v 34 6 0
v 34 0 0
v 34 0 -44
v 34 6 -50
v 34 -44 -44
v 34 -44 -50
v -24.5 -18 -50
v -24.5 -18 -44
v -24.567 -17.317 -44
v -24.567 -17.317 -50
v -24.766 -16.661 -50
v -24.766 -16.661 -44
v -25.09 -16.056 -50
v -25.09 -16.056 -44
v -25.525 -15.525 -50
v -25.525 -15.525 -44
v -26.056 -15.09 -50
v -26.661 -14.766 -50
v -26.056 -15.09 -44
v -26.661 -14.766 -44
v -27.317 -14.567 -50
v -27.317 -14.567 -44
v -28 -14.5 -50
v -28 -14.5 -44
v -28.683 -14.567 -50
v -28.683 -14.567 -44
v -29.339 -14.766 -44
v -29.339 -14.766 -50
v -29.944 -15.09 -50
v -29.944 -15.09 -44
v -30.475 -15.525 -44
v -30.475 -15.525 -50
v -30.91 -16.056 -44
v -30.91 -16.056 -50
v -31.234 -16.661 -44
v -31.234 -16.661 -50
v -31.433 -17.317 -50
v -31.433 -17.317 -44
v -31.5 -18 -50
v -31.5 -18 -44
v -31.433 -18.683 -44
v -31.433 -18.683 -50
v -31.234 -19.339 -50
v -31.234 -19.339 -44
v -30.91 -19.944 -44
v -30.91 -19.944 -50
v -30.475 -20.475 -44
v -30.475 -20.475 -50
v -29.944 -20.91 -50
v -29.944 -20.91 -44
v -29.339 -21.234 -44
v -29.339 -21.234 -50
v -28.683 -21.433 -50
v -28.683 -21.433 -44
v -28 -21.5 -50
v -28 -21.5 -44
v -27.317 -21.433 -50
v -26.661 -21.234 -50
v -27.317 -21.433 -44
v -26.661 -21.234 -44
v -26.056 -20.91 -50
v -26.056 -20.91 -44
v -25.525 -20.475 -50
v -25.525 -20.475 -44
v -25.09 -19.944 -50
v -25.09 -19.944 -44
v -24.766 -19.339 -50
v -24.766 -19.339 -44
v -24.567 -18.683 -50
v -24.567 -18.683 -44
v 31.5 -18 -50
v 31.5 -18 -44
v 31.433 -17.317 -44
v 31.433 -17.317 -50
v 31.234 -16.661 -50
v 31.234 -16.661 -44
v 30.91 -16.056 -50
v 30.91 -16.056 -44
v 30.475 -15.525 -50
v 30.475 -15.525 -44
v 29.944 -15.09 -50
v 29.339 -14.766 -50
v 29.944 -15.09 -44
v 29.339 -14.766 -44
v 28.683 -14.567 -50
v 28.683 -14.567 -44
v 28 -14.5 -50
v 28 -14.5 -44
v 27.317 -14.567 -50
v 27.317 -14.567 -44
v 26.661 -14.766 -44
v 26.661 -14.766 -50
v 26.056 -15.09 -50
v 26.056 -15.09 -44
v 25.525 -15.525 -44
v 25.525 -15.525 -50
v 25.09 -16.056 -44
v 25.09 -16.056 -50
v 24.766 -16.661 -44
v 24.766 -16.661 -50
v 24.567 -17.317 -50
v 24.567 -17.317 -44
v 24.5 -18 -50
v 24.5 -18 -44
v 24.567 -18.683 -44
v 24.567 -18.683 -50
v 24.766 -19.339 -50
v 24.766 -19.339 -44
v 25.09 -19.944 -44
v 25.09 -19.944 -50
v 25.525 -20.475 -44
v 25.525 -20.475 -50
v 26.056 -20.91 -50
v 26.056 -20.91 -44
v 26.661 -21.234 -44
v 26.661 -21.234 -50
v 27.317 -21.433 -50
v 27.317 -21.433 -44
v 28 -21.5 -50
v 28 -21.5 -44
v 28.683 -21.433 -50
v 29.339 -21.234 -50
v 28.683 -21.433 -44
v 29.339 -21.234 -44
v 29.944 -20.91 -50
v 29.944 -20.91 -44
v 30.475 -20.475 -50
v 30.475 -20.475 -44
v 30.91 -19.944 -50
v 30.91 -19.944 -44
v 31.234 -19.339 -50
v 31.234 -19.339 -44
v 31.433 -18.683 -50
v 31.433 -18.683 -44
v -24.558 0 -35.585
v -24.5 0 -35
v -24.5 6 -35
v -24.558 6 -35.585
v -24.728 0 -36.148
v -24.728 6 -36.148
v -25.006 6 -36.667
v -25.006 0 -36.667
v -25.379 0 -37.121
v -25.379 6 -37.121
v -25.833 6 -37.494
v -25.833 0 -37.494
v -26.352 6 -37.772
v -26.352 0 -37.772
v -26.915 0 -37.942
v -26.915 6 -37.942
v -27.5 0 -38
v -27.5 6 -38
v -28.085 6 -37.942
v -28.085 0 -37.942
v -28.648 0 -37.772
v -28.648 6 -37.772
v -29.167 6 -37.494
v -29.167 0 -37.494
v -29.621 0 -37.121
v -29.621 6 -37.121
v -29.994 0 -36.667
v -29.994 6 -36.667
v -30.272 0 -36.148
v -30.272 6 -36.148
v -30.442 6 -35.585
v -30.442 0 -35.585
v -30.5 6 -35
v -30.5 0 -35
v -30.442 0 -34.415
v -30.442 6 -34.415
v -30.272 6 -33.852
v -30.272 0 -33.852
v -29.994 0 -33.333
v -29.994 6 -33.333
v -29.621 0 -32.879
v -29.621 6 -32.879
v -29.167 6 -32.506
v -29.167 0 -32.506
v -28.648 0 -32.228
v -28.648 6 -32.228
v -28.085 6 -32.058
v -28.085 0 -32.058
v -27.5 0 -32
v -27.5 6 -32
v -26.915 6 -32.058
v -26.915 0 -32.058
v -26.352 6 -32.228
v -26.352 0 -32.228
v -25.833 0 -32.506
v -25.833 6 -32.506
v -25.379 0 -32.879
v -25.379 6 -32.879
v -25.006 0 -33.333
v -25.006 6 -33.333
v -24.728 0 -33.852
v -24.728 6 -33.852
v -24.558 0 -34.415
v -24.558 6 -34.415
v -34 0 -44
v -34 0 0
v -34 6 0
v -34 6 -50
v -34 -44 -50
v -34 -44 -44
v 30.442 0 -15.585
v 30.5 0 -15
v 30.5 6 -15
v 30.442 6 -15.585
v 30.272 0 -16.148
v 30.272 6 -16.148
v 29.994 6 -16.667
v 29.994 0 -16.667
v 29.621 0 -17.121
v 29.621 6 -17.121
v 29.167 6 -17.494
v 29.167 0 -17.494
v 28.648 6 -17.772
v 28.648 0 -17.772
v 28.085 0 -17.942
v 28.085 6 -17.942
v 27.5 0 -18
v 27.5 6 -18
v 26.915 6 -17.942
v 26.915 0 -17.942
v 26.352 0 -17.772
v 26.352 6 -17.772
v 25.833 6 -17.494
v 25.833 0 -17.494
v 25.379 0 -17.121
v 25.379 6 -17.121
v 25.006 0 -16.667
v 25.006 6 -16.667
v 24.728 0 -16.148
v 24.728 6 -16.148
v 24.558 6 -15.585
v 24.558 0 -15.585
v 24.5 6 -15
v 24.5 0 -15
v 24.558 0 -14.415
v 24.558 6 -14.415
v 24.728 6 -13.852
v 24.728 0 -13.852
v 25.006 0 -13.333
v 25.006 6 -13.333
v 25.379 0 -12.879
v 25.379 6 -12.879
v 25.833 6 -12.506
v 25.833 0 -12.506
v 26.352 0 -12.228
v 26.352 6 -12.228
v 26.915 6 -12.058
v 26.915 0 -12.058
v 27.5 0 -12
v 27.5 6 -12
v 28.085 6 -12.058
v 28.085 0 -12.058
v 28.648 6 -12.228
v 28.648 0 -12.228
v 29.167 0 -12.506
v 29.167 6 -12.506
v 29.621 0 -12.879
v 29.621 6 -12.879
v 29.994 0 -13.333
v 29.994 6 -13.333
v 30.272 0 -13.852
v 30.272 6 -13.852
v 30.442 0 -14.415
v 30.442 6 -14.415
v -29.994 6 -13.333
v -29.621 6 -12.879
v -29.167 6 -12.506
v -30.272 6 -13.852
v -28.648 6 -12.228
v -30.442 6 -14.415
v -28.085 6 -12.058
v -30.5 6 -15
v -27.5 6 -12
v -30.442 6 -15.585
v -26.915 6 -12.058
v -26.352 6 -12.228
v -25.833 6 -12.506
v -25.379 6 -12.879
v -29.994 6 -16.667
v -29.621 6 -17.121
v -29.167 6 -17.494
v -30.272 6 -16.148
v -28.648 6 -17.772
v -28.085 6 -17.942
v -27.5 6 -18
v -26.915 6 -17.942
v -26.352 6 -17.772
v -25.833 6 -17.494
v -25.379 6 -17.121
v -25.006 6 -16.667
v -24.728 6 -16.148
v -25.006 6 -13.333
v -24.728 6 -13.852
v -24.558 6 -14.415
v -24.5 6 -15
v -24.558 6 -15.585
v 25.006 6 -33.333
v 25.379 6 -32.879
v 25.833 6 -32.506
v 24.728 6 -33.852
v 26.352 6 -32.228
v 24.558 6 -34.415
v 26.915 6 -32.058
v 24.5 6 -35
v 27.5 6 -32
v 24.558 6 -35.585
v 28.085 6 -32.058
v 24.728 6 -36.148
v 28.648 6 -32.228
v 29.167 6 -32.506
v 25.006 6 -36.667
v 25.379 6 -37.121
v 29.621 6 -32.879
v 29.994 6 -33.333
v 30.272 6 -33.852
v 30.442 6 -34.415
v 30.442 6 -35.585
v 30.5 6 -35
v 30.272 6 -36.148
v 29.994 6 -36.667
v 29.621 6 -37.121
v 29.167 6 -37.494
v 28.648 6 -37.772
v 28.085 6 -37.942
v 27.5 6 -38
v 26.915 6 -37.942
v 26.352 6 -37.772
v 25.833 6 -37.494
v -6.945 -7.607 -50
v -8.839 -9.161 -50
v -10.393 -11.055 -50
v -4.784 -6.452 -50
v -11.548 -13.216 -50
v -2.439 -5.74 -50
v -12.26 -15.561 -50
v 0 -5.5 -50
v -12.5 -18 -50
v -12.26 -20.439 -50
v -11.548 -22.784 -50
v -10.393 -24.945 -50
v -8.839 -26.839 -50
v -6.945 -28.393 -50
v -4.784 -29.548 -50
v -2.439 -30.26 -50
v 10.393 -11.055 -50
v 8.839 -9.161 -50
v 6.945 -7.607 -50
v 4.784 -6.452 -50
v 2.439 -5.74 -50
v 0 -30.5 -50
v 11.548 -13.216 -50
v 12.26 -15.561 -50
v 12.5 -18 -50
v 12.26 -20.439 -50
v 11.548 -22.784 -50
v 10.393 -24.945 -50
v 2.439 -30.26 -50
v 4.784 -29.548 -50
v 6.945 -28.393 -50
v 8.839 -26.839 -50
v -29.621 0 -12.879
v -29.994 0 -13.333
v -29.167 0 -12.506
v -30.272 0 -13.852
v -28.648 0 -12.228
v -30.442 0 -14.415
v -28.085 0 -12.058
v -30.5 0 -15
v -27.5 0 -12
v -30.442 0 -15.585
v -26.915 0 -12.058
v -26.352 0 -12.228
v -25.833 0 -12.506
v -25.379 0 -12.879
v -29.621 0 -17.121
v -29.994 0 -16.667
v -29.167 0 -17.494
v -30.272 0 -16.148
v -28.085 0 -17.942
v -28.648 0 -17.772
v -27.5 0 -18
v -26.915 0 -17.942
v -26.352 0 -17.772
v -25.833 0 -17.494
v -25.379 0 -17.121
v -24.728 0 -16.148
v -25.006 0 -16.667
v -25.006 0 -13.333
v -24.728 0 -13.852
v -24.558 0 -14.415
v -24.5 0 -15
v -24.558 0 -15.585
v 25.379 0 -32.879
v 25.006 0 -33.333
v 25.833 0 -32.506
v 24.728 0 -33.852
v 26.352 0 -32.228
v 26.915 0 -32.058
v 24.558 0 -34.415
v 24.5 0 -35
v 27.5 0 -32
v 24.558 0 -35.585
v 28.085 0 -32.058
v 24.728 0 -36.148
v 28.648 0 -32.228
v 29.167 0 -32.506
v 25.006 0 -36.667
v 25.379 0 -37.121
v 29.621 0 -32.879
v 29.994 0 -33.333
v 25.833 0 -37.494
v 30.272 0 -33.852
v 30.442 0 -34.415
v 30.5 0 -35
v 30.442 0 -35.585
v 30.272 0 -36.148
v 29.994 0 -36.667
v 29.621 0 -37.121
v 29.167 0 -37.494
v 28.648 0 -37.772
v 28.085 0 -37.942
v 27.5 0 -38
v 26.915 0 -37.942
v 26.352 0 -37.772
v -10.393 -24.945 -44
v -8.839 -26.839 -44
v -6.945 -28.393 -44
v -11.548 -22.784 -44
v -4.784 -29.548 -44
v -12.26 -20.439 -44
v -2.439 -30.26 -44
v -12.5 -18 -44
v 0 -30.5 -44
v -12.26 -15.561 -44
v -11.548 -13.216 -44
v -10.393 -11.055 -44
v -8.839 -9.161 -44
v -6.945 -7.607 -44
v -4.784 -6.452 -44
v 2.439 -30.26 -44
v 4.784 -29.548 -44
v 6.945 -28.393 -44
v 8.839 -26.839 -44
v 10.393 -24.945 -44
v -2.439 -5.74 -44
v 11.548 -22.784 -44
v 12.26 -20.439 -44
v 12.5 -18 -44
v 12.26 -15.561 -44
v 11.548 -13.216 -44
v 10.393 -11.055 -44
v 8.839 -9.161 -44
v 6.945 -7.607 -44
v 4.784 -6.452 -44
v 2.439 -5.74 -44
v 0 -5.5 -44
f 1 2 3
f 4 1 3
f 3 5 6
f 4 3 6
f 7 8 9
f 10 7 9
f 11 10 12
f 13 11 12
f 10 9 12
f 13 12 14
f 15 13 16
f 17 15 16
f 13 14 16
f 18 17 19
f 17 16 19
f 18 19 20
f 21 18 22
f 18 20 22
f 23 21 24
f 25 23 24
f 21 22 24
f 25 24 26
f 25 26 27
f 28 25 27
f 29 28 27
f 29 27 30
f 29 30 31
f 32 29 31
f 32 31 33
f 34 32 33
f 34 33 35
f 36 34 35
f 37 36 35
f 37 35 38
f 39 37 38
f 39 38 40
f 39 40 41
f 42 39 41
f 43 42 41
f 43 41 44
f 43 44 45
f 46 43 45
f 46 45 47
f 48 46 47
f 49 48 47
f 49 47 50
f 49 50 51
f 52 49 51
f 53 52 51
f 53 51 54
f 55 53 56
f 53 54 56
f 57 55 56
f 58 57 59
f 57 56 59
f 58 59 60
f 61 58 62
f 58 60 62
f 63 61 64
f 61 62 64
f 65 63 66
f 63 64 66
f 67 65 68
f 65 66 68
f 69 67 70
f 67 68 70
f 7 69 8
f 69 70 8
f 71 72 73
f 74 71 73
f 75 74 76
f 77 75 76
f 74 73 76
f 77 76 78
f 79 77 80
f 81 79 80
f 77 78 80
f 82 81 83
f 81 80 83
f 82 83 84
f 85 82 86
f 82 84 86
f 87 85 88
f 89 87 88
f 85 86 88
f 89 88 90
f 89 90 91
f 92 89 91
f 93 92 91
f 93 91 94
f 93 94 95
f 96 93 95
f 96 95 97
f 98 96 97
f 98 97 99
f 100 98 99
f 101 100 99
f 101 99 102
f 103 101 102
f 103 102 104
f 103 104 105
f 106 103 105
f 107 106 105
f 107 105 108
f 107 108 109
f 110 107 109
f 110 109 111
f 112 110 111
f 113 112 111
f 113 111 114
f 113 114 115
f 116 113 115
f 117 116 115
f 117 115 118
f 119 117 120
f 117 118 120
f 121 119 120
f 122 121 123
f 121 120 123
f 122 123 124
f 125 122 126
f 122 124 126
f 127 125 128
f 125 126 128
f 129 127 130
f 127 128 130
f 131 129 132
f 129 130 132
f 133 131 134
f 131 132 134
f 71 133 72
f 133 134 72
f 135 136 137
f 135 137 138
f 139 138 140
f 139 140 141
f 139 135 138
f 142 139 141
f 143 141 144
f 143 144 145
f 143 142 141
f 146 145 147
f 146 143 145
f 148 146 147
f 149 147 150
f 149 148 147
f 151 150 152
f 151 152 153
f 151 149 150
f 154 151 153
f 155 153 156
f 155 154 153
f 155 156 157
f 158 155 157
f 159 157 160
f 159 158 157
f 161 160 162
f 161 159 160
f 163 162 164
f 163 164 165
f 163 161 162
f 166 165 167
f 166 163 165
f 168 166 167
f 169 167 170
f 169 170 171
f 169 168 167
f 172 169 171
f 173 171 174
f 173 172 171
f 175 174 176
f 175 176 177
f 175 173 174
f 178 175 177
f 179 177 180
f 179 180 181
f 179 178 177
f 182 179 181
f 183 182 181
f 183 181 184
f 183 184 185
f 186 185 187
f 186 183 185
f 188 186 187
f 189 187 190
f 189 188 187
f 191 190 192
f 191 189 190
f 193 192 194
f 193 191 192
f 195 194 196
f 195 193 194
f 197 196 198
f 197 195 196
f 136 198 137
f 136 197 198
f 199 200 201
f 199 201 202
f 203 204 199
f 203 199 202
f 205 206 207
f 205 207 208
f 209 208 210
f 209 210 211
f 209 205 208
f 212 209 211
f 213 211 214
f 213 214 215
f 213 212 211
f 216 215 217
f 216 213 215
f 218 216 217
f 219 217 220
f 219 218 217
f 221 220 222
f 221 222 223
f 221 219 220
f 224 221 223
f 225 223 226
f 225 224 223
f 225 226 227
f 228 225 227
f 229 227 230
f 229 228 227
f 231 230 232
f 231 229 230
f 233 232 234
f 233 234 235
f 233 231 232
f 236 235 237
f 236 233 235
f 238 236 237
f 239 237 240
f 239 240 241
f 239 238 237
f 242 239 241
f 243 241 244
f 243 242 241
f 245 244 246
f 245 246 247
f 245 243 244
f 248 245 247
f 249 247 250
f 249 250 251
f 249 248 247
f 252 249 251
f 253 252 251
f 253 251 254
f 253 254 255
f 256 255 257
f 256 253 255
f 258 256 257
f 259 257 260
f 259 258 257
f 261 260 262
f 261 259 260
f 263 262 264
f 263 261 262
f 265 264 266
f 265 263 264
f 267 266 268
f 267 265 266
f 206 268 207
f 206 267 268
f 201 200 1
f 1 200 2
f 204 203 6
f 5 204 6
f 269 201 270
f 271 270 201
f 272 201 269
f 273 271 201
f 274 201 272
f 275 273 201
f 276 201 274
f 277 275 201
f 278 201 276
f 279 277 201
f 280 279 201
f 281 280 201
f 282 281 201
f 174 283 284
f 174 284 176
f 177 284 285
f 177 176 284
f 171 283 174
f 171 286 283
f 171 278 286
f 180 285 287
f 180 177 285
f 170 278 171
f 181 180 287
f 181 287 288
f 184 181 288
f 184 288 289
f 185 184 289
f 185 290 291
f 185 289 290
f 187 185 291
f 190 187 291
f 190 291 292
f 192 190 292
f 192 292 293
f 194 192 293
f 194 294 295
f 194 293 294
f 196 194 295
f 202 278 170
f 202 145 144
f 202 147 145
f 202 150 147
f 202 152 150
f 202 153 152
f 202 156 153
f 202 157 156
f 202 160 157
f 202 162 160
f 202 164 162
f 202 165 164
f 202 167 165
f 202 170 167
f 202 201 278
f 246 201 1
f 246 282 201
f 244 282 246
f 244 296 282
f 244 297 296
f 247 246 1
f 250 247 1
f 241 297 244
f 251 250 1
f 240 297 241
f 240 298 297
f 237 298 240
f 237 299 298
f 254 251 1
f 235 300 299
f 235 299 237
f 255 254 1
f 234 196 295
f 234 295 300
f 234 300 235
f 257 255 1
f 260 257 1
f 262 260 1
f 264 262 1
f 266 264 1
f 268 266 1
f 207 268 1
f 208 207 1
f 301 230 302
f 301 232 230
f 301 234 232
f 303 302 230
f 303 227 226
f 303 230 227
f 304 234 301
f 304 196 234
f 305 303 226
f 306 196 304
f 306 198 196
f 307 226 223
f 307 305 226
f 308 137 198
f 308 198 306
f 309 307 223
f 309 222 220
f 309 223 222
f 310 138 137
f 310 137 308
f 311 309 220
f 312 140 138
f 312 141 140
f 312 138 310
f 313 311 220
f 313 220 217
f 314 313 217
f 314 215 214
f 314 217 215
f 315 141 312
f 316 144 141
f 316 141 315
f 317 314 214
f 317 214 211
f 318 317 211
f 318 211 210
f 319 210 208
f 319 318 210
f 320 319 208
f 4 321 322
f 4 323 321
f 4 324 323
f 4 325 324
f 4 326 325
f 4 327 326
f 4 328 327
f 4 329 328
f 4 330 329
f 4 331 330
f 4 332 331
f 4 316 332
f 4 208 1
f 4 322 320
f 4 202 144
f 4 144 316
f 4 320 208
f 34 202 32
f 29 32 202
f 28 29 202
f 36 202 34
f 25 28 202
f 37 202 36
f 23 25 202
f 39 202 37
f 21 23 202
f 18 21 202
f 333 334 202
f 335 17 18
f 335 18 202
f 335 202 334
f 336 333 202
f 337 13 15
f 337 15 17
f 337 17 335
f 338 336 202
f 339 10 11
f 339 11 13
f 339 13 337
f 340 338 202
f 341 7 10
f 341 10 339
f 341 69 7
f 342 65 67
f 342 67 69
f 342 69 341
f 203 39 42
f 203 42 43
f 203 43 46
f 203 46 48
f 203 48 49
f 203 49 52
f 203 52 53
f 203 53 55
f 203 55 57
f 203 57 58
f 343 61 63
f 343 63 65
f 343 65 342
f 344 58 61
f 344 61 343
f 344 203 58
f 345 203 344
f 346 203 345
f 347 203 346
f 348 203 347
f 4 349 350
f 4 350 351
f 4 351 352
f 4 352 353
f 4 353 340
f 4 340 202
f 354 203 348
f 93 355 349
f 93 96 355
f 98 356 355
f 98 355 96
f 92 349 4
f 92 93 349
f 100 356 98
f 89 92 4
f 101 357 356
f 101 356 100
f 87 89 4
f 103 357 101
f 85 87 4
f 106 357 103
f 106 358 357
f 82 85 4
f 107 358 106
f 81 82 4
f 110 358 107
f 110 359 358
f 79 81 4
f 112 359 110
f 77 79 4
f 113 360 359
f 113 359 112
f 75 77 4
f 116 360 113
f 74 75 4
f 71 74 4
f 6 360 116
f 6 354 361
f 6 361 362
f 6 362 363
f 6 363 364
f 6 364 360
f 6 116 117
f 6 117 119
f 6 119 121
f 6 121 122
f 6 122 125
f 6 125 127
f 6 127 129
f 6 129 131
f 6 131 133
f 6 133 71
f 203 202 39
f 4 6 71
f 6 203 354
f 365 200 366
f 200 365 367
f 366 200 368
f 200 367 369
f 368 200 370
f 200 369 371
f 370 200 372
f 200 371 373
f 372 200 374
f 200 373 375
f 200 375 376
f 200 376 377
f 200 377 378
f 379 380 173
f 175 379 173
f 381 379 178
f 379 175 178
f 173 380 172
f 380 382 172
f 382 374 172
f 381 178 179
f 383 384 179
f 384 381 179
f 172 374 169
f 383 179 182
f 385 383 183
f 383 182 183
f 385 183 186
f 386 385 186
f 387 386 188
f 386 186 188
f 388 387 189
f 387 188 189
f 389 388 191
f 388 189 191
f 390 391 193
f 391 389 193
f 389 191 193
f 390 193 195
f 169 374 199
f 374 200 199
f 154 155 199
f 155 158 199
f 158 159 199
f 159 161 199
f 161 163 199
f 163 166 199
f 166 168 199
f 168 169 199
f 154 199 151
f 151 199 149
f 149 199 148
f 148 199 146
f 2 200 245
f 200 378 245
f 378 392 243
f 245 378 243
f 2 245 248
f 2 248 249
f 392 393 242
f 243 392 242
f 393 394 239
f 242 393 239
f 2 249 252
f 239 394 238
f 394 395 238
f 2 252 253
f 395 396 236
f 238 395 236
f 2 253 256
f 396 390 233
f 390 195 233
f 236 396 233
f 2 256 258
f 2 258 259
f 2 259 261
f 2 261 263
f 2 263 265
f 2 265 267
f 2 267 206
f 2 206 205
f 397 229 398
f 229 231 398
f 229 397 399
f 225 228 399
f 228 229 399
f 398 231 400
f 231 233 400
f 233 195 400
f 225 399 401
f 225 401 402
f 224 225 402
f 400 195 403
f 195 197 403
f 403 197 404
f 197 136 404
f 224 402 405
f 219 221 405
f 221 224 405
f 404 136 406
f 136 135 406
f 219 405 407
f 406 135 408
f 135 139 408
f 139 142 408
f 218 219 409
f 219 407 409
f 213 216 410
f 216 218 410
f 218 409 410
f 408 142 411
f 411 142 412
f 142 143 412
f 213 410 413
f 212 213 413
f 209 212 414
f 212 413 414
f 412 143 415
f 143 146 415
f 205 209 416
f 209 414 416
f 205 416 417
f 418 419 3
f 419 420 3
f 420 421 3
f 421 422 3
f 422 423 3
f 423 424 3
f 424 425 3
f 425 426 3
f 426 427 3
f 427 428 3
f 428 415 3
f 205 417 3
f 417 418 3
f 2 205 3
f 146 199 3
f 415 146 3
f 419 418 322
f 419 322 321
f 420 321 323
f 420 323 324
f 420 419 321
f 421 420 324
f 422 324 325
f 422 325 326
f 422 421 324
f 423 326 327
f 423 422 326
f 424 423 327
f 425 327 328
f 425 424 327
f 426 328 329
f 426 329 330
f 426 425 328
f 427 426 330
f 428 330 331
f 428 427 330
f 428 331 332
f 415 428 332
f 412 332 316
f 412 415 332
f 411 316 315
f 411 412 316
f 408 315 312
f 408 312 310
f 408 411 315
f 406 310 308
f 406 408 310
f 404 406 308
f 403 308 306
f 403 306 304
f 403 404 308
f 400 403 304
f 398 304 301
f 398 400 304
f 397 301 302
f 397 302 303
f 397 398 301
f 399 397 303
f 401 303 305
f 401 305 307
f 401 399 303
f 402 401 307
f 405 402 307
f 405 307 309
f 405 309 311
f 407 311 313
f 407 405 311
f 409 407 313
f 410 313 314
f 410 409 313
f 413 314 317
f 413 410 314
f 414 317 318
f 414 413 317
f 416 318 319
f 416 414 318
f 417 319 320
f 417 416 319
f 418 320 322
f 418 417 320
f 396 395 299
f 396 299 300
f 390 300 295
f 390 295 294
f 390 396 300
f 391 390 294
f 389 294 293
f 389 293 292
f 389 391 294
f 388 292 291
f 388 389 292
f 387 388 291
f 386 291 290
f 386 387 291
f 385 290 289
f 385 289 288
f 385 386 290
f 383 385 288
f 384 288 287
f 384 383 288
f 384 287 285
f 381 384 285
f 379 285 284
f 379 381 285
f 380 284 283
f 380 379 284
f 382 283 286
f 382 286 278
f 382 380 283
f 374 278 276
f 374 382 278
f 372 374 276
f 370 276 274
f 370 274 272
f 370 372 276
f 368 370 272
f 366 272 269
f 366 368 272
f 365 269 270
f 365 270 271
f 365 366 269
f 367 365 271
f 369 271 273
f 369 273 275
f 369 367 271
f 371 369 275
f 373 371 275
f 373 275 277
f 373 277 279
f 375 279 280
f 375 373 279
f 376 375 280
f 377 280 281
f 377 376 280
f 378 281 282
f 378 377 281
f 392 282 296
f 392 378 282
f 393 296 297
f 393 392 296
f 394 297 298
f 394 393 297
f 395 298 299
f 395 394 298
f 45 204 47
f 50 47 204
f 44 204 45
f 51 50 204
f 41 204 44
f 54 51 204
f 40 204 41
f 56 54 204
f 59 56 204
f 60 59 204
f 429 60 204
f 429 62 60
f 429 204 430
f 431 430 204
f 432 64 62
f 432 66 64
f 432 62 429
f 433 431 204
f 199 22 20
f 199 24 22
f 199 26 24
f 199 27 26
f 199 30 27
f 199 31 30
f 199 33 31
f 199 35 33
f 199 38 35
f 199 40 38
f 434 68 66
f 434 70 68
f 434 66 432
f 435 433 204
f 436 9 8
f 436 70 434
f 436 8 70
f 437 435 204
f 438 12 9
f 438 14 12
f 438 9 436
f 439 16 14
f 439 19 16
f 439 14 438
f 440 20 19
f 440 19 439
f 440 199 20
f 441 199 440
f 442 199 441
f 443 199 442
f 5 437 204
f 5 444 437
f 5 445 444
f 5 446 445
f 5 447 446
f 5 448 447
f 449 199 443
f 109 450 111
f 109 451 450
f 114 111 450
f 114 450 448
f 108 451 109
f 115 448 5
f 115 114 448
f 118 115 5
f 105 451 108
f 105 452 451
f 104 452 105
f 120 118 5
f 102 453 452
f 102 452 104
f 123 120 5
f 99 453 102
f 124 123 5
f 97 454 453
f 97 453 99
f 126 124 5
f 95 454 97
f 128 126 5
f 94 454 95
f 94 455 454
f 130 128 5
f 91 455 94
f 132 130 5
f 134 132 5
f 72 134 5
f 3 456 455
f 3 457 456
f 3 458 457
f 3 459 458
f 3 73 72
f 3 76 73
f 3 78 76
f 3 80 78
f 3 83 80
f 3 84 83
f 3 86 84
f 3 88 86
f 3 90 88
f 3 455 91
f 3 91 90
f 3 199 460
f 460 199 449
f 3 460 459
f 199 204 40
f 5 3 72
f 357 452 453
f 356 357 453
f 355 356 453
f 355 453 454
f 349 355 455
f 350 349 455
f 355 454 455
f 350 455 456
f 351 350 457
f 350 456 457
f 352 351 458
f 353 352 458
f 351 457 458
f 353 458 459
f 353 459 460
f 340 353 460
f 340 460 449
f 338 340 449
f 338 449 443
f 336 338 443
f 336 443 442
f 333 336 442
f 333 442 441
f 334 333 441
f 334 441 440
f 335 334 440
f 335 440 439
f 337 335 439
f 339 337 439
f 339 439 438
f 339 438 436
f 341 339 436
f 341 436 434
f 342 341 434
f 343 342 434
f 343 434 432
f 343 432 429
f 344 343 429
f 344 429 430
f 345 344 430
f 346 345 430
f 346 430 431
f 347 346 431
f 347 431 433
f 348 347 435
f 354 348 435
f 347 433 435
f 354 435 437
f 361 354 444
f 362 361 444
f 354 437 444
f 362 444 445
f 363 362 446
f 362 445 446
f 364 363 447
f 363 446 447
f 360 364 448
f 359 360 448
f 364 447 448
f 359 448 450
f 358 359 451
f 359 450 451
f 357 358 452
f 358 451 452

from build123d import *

# Parameters (mm, degrees)
SKETCH_1_W          = 68
SKETCH_1_H          = 50
SKETCH_1_R          = 3
EXTRUDE_1_DEPTH     = 6
SKETCH_3_W          = 68
SKETCH_3_H          = 6
EXTRUDE_2_DEPTH     = 50
CUT_EXTRUDE_1_REACH = 8
SKETCH_4_R          = 12.5
SKETCH_4_R_2        = 3.5


with BuildPart() as part:
    # 草图1 → 凸台-拉伸1 (new body)
    with BuildSketch(Plane(origin=(0, 0, 0), x_dir=(1, 0, 0), z_dir=(0, 1, 0))):
        with Locations((0, 25)):
            Rectangle(SKETCH_1_W, SKETCH_1_H)
        with Locations((-27.5, 35)):
            Circle(SKETCH_1_R, mode=Mode.SUBTRACT)
        with Locations((27.5, 35)):
            Circle(SKETCH_1_R, mode=Mode.SUBTRACT)
        with Locations((-27.5, 15)):
            Circle(SKETCH_1_R, mode=Mode.SUBTRACT)
        with Locations((27.5, 15)):
            Circle(SKETCH_1_R, mode=Mode.SUBTRACT)
    extrude(amount=EXTRUDE_1_DEPTH)

    # 草图3 → 凸台-拉伸2 (add)
    with BuildSketch(Plane(origin=(0, 6, 0), x_dir=(1, 0, 0), z_dir=(0, 1, 0))):
        with Locations((0, 47)):
            Rectangle(SKETCH_3_W, SKETCH_3_H)
    extrude(amount=-EXTRUDE_2_DEPTH)

    # 草图4 → 切除-拉伸1 (cut, up to next)
    with BuildSketch(Plane.XY.offset(-44), mode=Mode.PRIVATE) as cut_extrude_1_sk1:
        with Locations((0, -18)):
            Circle(SKETCH_4_R)
    cut_extrude_1_tool1 = extrude(cut_extrude_1_sk1.sketch, amount=-CUT_EXTRUDE_1_REACH, mode=Mode.PRIVATE) & part.part
    add(cut_extrude_1_tool1.solids().sort_by_distance((0, -18, -44))[0], mode=Mode.SUBTRACT)
    # 草图4 → 切除-拉伸1 (cut, up to next)
    with BuildSketch(Plane.XY.offset(-44), mode=Mode.PRIVATE) as cut_extrude_1_sk2:
        with Locations((28, -18)):
            Circle(SKETCH_4_R_2)
    cut_extrude_1_tool2 = extrude(cut_extrude_1_sk2.sketch, amount=-CUT_EXTRUDE_1_REACH, mode=Mode.PRIVATE) & part.part
    add(cut_extrude_1_tool2.solids().sort_by_distance((28, -18, -44))[0], mode=Mode.SUBTRACT)
    # 草图4 → 切除-拉伸1 (cut, up to next)
    with BuildSketch(Plane.XY.offset(-44), mode=Mode.PRIVATE) as cut_extrude_1_sk3:
        with Locations((-28, -18)):
            Circle(SKETCH_4_R_2)
    cut_extrude_1_tool3 = extrude(cut_extrude_1_sk3.sketch, amount=-CUT_EXTRUDE_1_REACH, mode=Mode.PRIVATE) & part.part
    add(cut_extrude_1_tool3.solids().sort_by_distance((-28, -18, -44))[0], mode=Mode.SUBTRACT)


solid = part.part
